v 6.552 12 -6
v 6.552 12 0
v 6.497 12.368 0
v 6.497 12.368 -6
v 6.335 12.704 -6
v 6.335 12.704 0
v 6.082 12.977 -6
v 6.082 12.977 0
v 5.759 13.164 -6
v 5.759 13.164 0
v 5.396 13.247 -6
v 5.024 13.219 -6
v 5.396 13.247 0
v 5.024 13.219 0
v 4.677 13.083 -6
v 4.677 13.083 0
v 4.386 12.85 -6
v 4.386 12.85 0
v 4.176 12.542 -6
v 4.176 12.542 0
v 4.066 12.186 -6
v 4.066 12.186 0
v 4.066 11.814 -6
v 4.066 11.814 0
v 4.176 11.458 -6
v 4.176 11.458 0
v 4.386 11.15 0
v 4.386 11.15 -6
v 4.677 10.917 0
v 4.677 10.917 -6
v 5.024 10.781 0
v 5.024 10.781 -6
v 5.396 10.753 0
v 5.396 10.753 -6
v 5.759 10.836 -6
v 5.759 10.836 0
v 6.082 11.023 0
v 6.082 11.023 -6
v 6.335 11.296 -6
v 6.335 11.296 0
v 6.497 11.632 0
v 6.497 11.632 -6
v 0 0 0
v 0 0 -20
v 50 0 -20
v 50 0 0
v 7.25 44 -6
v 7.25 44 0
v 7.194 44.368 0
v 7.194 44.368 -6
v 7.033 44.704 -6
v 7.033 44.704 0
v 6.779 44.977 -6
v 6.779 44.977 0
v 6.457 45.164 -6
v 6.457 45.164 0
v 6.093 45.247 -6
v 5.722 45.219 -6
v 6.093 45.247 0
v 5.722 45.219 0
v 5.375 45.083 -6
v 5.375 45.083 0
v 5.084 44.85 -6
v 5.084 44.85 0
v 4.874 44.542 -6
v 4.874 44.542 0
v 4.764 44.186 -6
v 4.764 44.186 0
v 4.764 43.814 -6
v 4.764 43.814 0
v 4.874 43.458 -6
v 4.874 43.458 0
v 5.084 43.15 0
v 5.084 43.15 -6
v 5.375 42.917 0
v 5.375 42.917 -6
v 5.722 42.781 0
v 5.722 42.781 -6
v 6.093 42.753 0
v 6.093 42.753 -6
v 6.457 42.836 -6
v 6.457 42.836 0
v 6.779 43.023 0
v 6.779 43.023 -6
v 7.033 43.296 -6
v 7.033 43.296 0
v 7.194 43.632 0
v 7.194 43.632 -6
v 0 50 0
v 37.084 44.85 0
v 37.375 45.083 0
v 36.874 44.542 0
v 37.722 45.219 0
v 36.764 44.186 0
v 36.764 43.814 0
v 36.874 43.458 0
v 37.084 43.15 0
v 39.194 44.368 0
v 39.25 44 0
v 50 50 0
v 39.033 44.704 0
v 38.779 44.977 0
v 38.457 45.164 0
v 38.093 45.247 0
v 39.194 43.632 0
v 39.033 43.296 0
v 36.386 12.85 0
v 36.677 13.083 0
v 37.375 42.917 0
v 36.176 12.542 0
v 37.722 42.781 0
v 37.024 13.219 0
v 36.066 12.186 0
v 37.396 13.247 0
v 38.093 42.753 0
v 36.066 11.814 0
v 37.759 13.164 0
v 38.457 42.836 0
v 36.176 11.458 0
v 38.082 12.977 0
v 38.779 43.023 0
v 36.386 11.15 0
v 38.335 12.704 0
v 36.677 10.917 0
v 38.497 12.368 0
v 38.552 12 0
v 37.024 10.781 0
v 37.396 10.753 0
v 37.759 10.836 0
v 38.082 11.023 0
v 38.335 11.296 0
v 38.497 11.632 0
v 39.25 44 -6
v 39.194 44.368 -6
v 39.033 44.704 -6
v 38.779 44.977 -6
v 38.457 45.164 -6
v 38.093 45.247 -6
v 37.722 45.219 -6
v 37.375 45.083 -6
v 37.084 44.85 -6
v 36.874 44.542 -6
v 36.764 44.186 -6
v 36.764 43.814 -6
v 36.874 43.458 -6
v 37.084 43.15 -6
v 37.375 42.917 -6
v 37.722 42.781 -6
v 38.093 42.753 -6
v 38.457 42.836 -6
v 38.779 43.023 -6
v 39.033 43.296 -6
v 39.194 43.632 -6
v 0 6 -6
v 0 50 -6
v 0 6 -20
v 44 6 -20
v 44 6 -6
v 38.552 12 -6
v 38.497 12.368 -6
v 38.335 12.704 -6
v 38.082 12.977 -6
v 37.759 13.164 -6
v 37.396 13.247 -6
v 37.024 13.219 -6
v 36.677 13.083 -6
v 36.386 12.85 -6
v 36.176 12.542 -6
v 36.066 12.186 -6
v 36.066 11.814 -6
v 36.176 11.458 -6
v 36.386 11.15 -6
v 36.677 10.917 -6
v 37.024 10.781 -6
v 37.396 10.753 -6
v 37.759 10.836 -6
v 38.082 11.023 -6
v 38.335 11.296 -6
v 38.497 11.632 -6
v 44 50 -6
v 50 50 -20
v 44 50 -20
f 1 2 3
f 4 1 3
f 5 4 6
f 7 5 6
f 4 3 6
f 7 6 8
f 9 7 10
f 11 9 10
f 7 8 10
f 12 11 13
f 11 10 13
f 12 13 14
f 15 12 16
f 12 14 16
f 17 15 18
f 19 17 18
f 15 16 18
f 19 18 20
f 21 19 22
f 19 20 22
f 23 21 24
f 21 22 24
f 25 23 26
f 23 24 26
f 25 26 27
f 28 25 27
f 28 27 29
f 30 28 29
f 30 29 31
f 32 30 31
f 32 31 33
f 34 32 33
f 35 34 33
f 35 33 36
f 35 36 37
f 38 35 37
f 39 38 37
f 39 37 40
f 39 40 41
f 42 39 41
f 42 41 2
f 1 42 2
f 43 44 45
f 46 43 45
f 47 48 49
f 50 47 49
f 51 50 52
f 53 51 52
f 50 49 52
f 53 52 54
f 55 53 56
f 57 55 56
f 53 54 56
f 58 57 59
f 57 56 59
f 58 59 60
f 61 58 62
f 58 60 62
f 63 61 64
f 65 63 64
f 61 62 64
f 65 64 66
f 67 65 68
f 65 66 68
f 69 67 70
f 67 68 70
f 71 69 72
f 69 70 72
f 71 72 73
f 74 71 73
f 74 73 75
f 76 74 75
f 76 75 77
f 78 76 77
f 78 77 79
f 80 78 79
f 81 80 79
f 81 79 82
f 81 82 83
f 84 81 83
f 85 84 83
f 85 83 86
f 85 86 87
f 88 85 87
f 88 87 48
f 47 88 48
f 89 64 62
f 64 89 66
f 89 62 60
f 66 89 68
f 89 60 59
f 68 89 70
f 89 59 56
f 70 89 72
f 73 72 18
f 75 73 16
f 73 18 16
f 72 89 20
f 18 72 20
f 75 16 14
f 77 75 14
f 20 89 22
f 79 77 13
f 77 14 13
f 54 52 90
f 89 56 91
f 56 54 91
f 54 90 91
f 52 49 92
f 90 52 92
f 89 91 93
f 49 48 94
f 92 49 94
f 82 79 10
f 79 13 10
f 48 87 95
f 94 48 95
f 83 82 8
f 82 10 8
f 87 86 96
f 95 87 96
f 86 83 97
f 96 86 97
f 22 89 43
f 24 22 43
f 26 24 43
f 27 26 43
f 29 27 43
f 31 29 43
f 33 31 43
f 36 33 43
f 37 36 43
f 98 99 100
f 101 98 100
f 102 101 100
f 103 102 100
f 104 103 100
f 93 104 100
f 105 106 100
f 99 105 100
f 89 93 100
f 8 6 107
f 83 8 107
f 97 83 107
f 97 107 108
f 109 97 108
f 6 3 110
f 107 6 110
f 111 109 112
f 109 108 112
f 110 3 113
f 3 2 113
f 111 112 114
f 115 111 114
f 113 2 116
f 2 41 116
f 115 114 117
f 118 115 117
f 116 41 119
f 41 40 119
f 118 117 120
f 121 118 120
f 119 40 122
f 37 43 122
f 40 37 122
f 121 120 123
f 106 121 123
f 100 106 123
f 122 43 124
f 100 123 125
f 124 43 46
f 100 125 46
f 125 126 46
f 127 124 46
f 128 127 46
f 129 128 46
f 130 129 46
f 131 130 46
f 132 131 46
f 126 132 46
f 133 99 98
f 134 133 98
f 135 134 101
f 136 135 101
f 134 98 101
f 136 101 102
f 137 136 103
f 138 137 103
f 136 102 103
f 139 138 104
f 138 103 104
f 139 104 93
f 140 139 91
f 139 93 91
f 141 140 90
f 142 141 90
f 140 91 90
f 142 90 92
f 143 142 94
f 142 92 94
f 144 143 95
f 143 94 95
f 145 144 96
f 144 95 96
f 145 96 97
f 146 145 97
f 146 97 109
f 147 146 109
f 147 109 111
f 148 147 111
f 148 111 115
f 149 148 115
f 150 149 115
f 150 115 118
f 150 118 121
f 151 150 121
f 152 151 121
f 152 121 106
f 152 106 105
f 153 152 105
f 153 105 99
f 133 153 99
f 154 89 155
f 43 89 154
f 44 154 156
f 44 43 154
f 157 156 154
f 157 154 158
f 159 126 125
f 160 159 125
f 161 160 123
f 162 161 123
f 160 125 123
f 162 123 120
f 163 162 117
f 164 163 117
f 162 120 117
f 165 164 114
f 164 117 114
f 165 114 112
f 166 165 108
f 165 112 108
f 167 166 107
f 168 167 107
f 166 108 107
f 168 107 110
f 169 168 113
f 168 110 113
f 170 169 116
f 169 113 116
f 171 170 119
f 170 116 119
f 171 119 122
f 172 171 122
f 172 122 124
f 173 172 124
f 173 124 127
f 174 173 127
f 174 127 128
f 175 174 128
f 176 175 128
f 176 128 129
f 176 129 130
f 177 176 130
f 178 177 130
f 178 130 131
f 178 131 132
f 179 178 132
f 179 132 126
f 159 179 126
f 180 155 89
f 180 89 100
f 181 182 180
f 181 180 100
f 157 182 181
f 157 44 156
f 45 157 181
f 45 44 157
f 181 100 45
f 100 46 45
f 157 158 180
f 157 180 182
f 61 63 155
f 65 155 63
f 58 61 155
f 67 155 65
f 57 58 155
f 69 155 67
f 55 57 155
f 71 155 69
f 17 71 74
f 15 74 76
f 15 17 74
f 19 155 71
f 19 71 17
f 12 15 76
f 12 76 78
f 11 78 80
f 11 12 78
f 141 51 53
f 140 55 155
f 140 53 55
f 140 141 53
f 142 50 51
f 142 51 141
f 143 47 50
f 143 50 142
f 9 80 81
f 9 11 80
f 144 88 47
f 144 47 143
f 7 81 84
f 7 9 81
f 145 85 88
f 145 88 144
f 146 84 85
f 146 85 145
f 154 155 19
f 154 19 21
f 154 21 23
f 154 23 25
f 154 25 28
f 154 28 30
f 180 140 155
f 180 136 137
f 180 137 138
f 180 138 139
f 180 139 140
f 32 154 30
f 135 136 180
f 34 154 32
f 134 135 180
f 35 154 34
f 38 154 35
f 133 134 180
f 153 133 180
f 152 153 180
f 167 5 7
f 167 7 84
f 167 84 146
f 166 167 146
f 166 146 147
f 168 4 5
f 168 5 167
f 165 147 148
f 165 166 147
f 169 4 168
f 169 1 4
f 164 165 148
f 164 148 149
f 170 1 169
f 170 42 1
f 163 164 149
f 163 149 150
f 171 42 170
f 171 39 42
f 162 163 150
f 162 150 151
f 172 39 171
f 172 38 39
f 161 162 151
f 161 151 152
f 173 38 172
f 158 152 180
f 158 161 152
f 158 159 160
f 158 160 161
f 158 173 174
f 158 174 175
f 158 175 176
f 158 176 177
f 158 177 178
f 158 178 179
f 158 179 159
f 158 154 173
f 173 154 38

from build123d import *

# Parameters (mm, degrees)
SKETCH1_W           = 50
SKETCH1_H           = 20
BOSS_EXTRUDE1_DEPTH = 6
SKETCH2_W           = 6
SKETCH2_H           = 20
BOSS_EXTRUDE2_DEPTH = 44
SKETCH3_W           = 44
SKETCH3_H           = 6
BOSS_EXTRUDE3_DEPTH = 44
SKETCH5_R           = 1.25
CUT_EXTRUDE1_DEPTH  = 74.484692283


with BuildPart() as part:
    # Sketch1 → Boss-Extrude1 (new body)
    with BuildSketch(Plane(origin=(0, 0, 0), x_dir=(1, 0, 0), z_dir=(0, 1, 0))):
        with Locations((25, 10)):
            Rectangle(SKETCH1_W, SKETCH1_H)
    extrude(amount=BOSS_EXTRUDE1_DEPTH)

    # Sketch2 → Boss-Extrude2 (add)
    with BuildSketch(Plane(origin=(0, 6, 0), x_dir=(1, 0, 0), z_dir=(0, 1, 0))):
        with Locations((47, 10)):
            Rectangle(SKETCH2_W, SKETCH2_H)
    extrude(amount=BOSS_EXTRUDE2_DEPTH)

    # Sketch3 → Boss-Extrude3 (add)
    with BuildSketch(Plane(origin=(0, 6, 0), x_dir=(1, 0, 0), z_dir=(0, 1, 0))):
        with Locations((22, 3)):
            Rectangle(SKETCH3_W, SKETCH3_H)
    extrude(amount=BOSS_EXTRUDE3_DEPTH)

    # Sketch5 → Cut-Extrude1 (cut, through all)
    with BuildSketch(Plane.XY):
        with Locations((6, 44)):
            Circle(SKETCH5_R)
        with Locations((38, 44)):
            Circle(SKETCH5_R)
        with Locations((5.302448234, 12)):
            Circle(SKETCH5_R)
        with Locations((37.302448234, 12)):
            Circle(SKETCH5_R)
    extrude(amount=-CUT_EXTRUDE1_DEPTH, mode=Mode.SUBTRACT)


solid = part.part
